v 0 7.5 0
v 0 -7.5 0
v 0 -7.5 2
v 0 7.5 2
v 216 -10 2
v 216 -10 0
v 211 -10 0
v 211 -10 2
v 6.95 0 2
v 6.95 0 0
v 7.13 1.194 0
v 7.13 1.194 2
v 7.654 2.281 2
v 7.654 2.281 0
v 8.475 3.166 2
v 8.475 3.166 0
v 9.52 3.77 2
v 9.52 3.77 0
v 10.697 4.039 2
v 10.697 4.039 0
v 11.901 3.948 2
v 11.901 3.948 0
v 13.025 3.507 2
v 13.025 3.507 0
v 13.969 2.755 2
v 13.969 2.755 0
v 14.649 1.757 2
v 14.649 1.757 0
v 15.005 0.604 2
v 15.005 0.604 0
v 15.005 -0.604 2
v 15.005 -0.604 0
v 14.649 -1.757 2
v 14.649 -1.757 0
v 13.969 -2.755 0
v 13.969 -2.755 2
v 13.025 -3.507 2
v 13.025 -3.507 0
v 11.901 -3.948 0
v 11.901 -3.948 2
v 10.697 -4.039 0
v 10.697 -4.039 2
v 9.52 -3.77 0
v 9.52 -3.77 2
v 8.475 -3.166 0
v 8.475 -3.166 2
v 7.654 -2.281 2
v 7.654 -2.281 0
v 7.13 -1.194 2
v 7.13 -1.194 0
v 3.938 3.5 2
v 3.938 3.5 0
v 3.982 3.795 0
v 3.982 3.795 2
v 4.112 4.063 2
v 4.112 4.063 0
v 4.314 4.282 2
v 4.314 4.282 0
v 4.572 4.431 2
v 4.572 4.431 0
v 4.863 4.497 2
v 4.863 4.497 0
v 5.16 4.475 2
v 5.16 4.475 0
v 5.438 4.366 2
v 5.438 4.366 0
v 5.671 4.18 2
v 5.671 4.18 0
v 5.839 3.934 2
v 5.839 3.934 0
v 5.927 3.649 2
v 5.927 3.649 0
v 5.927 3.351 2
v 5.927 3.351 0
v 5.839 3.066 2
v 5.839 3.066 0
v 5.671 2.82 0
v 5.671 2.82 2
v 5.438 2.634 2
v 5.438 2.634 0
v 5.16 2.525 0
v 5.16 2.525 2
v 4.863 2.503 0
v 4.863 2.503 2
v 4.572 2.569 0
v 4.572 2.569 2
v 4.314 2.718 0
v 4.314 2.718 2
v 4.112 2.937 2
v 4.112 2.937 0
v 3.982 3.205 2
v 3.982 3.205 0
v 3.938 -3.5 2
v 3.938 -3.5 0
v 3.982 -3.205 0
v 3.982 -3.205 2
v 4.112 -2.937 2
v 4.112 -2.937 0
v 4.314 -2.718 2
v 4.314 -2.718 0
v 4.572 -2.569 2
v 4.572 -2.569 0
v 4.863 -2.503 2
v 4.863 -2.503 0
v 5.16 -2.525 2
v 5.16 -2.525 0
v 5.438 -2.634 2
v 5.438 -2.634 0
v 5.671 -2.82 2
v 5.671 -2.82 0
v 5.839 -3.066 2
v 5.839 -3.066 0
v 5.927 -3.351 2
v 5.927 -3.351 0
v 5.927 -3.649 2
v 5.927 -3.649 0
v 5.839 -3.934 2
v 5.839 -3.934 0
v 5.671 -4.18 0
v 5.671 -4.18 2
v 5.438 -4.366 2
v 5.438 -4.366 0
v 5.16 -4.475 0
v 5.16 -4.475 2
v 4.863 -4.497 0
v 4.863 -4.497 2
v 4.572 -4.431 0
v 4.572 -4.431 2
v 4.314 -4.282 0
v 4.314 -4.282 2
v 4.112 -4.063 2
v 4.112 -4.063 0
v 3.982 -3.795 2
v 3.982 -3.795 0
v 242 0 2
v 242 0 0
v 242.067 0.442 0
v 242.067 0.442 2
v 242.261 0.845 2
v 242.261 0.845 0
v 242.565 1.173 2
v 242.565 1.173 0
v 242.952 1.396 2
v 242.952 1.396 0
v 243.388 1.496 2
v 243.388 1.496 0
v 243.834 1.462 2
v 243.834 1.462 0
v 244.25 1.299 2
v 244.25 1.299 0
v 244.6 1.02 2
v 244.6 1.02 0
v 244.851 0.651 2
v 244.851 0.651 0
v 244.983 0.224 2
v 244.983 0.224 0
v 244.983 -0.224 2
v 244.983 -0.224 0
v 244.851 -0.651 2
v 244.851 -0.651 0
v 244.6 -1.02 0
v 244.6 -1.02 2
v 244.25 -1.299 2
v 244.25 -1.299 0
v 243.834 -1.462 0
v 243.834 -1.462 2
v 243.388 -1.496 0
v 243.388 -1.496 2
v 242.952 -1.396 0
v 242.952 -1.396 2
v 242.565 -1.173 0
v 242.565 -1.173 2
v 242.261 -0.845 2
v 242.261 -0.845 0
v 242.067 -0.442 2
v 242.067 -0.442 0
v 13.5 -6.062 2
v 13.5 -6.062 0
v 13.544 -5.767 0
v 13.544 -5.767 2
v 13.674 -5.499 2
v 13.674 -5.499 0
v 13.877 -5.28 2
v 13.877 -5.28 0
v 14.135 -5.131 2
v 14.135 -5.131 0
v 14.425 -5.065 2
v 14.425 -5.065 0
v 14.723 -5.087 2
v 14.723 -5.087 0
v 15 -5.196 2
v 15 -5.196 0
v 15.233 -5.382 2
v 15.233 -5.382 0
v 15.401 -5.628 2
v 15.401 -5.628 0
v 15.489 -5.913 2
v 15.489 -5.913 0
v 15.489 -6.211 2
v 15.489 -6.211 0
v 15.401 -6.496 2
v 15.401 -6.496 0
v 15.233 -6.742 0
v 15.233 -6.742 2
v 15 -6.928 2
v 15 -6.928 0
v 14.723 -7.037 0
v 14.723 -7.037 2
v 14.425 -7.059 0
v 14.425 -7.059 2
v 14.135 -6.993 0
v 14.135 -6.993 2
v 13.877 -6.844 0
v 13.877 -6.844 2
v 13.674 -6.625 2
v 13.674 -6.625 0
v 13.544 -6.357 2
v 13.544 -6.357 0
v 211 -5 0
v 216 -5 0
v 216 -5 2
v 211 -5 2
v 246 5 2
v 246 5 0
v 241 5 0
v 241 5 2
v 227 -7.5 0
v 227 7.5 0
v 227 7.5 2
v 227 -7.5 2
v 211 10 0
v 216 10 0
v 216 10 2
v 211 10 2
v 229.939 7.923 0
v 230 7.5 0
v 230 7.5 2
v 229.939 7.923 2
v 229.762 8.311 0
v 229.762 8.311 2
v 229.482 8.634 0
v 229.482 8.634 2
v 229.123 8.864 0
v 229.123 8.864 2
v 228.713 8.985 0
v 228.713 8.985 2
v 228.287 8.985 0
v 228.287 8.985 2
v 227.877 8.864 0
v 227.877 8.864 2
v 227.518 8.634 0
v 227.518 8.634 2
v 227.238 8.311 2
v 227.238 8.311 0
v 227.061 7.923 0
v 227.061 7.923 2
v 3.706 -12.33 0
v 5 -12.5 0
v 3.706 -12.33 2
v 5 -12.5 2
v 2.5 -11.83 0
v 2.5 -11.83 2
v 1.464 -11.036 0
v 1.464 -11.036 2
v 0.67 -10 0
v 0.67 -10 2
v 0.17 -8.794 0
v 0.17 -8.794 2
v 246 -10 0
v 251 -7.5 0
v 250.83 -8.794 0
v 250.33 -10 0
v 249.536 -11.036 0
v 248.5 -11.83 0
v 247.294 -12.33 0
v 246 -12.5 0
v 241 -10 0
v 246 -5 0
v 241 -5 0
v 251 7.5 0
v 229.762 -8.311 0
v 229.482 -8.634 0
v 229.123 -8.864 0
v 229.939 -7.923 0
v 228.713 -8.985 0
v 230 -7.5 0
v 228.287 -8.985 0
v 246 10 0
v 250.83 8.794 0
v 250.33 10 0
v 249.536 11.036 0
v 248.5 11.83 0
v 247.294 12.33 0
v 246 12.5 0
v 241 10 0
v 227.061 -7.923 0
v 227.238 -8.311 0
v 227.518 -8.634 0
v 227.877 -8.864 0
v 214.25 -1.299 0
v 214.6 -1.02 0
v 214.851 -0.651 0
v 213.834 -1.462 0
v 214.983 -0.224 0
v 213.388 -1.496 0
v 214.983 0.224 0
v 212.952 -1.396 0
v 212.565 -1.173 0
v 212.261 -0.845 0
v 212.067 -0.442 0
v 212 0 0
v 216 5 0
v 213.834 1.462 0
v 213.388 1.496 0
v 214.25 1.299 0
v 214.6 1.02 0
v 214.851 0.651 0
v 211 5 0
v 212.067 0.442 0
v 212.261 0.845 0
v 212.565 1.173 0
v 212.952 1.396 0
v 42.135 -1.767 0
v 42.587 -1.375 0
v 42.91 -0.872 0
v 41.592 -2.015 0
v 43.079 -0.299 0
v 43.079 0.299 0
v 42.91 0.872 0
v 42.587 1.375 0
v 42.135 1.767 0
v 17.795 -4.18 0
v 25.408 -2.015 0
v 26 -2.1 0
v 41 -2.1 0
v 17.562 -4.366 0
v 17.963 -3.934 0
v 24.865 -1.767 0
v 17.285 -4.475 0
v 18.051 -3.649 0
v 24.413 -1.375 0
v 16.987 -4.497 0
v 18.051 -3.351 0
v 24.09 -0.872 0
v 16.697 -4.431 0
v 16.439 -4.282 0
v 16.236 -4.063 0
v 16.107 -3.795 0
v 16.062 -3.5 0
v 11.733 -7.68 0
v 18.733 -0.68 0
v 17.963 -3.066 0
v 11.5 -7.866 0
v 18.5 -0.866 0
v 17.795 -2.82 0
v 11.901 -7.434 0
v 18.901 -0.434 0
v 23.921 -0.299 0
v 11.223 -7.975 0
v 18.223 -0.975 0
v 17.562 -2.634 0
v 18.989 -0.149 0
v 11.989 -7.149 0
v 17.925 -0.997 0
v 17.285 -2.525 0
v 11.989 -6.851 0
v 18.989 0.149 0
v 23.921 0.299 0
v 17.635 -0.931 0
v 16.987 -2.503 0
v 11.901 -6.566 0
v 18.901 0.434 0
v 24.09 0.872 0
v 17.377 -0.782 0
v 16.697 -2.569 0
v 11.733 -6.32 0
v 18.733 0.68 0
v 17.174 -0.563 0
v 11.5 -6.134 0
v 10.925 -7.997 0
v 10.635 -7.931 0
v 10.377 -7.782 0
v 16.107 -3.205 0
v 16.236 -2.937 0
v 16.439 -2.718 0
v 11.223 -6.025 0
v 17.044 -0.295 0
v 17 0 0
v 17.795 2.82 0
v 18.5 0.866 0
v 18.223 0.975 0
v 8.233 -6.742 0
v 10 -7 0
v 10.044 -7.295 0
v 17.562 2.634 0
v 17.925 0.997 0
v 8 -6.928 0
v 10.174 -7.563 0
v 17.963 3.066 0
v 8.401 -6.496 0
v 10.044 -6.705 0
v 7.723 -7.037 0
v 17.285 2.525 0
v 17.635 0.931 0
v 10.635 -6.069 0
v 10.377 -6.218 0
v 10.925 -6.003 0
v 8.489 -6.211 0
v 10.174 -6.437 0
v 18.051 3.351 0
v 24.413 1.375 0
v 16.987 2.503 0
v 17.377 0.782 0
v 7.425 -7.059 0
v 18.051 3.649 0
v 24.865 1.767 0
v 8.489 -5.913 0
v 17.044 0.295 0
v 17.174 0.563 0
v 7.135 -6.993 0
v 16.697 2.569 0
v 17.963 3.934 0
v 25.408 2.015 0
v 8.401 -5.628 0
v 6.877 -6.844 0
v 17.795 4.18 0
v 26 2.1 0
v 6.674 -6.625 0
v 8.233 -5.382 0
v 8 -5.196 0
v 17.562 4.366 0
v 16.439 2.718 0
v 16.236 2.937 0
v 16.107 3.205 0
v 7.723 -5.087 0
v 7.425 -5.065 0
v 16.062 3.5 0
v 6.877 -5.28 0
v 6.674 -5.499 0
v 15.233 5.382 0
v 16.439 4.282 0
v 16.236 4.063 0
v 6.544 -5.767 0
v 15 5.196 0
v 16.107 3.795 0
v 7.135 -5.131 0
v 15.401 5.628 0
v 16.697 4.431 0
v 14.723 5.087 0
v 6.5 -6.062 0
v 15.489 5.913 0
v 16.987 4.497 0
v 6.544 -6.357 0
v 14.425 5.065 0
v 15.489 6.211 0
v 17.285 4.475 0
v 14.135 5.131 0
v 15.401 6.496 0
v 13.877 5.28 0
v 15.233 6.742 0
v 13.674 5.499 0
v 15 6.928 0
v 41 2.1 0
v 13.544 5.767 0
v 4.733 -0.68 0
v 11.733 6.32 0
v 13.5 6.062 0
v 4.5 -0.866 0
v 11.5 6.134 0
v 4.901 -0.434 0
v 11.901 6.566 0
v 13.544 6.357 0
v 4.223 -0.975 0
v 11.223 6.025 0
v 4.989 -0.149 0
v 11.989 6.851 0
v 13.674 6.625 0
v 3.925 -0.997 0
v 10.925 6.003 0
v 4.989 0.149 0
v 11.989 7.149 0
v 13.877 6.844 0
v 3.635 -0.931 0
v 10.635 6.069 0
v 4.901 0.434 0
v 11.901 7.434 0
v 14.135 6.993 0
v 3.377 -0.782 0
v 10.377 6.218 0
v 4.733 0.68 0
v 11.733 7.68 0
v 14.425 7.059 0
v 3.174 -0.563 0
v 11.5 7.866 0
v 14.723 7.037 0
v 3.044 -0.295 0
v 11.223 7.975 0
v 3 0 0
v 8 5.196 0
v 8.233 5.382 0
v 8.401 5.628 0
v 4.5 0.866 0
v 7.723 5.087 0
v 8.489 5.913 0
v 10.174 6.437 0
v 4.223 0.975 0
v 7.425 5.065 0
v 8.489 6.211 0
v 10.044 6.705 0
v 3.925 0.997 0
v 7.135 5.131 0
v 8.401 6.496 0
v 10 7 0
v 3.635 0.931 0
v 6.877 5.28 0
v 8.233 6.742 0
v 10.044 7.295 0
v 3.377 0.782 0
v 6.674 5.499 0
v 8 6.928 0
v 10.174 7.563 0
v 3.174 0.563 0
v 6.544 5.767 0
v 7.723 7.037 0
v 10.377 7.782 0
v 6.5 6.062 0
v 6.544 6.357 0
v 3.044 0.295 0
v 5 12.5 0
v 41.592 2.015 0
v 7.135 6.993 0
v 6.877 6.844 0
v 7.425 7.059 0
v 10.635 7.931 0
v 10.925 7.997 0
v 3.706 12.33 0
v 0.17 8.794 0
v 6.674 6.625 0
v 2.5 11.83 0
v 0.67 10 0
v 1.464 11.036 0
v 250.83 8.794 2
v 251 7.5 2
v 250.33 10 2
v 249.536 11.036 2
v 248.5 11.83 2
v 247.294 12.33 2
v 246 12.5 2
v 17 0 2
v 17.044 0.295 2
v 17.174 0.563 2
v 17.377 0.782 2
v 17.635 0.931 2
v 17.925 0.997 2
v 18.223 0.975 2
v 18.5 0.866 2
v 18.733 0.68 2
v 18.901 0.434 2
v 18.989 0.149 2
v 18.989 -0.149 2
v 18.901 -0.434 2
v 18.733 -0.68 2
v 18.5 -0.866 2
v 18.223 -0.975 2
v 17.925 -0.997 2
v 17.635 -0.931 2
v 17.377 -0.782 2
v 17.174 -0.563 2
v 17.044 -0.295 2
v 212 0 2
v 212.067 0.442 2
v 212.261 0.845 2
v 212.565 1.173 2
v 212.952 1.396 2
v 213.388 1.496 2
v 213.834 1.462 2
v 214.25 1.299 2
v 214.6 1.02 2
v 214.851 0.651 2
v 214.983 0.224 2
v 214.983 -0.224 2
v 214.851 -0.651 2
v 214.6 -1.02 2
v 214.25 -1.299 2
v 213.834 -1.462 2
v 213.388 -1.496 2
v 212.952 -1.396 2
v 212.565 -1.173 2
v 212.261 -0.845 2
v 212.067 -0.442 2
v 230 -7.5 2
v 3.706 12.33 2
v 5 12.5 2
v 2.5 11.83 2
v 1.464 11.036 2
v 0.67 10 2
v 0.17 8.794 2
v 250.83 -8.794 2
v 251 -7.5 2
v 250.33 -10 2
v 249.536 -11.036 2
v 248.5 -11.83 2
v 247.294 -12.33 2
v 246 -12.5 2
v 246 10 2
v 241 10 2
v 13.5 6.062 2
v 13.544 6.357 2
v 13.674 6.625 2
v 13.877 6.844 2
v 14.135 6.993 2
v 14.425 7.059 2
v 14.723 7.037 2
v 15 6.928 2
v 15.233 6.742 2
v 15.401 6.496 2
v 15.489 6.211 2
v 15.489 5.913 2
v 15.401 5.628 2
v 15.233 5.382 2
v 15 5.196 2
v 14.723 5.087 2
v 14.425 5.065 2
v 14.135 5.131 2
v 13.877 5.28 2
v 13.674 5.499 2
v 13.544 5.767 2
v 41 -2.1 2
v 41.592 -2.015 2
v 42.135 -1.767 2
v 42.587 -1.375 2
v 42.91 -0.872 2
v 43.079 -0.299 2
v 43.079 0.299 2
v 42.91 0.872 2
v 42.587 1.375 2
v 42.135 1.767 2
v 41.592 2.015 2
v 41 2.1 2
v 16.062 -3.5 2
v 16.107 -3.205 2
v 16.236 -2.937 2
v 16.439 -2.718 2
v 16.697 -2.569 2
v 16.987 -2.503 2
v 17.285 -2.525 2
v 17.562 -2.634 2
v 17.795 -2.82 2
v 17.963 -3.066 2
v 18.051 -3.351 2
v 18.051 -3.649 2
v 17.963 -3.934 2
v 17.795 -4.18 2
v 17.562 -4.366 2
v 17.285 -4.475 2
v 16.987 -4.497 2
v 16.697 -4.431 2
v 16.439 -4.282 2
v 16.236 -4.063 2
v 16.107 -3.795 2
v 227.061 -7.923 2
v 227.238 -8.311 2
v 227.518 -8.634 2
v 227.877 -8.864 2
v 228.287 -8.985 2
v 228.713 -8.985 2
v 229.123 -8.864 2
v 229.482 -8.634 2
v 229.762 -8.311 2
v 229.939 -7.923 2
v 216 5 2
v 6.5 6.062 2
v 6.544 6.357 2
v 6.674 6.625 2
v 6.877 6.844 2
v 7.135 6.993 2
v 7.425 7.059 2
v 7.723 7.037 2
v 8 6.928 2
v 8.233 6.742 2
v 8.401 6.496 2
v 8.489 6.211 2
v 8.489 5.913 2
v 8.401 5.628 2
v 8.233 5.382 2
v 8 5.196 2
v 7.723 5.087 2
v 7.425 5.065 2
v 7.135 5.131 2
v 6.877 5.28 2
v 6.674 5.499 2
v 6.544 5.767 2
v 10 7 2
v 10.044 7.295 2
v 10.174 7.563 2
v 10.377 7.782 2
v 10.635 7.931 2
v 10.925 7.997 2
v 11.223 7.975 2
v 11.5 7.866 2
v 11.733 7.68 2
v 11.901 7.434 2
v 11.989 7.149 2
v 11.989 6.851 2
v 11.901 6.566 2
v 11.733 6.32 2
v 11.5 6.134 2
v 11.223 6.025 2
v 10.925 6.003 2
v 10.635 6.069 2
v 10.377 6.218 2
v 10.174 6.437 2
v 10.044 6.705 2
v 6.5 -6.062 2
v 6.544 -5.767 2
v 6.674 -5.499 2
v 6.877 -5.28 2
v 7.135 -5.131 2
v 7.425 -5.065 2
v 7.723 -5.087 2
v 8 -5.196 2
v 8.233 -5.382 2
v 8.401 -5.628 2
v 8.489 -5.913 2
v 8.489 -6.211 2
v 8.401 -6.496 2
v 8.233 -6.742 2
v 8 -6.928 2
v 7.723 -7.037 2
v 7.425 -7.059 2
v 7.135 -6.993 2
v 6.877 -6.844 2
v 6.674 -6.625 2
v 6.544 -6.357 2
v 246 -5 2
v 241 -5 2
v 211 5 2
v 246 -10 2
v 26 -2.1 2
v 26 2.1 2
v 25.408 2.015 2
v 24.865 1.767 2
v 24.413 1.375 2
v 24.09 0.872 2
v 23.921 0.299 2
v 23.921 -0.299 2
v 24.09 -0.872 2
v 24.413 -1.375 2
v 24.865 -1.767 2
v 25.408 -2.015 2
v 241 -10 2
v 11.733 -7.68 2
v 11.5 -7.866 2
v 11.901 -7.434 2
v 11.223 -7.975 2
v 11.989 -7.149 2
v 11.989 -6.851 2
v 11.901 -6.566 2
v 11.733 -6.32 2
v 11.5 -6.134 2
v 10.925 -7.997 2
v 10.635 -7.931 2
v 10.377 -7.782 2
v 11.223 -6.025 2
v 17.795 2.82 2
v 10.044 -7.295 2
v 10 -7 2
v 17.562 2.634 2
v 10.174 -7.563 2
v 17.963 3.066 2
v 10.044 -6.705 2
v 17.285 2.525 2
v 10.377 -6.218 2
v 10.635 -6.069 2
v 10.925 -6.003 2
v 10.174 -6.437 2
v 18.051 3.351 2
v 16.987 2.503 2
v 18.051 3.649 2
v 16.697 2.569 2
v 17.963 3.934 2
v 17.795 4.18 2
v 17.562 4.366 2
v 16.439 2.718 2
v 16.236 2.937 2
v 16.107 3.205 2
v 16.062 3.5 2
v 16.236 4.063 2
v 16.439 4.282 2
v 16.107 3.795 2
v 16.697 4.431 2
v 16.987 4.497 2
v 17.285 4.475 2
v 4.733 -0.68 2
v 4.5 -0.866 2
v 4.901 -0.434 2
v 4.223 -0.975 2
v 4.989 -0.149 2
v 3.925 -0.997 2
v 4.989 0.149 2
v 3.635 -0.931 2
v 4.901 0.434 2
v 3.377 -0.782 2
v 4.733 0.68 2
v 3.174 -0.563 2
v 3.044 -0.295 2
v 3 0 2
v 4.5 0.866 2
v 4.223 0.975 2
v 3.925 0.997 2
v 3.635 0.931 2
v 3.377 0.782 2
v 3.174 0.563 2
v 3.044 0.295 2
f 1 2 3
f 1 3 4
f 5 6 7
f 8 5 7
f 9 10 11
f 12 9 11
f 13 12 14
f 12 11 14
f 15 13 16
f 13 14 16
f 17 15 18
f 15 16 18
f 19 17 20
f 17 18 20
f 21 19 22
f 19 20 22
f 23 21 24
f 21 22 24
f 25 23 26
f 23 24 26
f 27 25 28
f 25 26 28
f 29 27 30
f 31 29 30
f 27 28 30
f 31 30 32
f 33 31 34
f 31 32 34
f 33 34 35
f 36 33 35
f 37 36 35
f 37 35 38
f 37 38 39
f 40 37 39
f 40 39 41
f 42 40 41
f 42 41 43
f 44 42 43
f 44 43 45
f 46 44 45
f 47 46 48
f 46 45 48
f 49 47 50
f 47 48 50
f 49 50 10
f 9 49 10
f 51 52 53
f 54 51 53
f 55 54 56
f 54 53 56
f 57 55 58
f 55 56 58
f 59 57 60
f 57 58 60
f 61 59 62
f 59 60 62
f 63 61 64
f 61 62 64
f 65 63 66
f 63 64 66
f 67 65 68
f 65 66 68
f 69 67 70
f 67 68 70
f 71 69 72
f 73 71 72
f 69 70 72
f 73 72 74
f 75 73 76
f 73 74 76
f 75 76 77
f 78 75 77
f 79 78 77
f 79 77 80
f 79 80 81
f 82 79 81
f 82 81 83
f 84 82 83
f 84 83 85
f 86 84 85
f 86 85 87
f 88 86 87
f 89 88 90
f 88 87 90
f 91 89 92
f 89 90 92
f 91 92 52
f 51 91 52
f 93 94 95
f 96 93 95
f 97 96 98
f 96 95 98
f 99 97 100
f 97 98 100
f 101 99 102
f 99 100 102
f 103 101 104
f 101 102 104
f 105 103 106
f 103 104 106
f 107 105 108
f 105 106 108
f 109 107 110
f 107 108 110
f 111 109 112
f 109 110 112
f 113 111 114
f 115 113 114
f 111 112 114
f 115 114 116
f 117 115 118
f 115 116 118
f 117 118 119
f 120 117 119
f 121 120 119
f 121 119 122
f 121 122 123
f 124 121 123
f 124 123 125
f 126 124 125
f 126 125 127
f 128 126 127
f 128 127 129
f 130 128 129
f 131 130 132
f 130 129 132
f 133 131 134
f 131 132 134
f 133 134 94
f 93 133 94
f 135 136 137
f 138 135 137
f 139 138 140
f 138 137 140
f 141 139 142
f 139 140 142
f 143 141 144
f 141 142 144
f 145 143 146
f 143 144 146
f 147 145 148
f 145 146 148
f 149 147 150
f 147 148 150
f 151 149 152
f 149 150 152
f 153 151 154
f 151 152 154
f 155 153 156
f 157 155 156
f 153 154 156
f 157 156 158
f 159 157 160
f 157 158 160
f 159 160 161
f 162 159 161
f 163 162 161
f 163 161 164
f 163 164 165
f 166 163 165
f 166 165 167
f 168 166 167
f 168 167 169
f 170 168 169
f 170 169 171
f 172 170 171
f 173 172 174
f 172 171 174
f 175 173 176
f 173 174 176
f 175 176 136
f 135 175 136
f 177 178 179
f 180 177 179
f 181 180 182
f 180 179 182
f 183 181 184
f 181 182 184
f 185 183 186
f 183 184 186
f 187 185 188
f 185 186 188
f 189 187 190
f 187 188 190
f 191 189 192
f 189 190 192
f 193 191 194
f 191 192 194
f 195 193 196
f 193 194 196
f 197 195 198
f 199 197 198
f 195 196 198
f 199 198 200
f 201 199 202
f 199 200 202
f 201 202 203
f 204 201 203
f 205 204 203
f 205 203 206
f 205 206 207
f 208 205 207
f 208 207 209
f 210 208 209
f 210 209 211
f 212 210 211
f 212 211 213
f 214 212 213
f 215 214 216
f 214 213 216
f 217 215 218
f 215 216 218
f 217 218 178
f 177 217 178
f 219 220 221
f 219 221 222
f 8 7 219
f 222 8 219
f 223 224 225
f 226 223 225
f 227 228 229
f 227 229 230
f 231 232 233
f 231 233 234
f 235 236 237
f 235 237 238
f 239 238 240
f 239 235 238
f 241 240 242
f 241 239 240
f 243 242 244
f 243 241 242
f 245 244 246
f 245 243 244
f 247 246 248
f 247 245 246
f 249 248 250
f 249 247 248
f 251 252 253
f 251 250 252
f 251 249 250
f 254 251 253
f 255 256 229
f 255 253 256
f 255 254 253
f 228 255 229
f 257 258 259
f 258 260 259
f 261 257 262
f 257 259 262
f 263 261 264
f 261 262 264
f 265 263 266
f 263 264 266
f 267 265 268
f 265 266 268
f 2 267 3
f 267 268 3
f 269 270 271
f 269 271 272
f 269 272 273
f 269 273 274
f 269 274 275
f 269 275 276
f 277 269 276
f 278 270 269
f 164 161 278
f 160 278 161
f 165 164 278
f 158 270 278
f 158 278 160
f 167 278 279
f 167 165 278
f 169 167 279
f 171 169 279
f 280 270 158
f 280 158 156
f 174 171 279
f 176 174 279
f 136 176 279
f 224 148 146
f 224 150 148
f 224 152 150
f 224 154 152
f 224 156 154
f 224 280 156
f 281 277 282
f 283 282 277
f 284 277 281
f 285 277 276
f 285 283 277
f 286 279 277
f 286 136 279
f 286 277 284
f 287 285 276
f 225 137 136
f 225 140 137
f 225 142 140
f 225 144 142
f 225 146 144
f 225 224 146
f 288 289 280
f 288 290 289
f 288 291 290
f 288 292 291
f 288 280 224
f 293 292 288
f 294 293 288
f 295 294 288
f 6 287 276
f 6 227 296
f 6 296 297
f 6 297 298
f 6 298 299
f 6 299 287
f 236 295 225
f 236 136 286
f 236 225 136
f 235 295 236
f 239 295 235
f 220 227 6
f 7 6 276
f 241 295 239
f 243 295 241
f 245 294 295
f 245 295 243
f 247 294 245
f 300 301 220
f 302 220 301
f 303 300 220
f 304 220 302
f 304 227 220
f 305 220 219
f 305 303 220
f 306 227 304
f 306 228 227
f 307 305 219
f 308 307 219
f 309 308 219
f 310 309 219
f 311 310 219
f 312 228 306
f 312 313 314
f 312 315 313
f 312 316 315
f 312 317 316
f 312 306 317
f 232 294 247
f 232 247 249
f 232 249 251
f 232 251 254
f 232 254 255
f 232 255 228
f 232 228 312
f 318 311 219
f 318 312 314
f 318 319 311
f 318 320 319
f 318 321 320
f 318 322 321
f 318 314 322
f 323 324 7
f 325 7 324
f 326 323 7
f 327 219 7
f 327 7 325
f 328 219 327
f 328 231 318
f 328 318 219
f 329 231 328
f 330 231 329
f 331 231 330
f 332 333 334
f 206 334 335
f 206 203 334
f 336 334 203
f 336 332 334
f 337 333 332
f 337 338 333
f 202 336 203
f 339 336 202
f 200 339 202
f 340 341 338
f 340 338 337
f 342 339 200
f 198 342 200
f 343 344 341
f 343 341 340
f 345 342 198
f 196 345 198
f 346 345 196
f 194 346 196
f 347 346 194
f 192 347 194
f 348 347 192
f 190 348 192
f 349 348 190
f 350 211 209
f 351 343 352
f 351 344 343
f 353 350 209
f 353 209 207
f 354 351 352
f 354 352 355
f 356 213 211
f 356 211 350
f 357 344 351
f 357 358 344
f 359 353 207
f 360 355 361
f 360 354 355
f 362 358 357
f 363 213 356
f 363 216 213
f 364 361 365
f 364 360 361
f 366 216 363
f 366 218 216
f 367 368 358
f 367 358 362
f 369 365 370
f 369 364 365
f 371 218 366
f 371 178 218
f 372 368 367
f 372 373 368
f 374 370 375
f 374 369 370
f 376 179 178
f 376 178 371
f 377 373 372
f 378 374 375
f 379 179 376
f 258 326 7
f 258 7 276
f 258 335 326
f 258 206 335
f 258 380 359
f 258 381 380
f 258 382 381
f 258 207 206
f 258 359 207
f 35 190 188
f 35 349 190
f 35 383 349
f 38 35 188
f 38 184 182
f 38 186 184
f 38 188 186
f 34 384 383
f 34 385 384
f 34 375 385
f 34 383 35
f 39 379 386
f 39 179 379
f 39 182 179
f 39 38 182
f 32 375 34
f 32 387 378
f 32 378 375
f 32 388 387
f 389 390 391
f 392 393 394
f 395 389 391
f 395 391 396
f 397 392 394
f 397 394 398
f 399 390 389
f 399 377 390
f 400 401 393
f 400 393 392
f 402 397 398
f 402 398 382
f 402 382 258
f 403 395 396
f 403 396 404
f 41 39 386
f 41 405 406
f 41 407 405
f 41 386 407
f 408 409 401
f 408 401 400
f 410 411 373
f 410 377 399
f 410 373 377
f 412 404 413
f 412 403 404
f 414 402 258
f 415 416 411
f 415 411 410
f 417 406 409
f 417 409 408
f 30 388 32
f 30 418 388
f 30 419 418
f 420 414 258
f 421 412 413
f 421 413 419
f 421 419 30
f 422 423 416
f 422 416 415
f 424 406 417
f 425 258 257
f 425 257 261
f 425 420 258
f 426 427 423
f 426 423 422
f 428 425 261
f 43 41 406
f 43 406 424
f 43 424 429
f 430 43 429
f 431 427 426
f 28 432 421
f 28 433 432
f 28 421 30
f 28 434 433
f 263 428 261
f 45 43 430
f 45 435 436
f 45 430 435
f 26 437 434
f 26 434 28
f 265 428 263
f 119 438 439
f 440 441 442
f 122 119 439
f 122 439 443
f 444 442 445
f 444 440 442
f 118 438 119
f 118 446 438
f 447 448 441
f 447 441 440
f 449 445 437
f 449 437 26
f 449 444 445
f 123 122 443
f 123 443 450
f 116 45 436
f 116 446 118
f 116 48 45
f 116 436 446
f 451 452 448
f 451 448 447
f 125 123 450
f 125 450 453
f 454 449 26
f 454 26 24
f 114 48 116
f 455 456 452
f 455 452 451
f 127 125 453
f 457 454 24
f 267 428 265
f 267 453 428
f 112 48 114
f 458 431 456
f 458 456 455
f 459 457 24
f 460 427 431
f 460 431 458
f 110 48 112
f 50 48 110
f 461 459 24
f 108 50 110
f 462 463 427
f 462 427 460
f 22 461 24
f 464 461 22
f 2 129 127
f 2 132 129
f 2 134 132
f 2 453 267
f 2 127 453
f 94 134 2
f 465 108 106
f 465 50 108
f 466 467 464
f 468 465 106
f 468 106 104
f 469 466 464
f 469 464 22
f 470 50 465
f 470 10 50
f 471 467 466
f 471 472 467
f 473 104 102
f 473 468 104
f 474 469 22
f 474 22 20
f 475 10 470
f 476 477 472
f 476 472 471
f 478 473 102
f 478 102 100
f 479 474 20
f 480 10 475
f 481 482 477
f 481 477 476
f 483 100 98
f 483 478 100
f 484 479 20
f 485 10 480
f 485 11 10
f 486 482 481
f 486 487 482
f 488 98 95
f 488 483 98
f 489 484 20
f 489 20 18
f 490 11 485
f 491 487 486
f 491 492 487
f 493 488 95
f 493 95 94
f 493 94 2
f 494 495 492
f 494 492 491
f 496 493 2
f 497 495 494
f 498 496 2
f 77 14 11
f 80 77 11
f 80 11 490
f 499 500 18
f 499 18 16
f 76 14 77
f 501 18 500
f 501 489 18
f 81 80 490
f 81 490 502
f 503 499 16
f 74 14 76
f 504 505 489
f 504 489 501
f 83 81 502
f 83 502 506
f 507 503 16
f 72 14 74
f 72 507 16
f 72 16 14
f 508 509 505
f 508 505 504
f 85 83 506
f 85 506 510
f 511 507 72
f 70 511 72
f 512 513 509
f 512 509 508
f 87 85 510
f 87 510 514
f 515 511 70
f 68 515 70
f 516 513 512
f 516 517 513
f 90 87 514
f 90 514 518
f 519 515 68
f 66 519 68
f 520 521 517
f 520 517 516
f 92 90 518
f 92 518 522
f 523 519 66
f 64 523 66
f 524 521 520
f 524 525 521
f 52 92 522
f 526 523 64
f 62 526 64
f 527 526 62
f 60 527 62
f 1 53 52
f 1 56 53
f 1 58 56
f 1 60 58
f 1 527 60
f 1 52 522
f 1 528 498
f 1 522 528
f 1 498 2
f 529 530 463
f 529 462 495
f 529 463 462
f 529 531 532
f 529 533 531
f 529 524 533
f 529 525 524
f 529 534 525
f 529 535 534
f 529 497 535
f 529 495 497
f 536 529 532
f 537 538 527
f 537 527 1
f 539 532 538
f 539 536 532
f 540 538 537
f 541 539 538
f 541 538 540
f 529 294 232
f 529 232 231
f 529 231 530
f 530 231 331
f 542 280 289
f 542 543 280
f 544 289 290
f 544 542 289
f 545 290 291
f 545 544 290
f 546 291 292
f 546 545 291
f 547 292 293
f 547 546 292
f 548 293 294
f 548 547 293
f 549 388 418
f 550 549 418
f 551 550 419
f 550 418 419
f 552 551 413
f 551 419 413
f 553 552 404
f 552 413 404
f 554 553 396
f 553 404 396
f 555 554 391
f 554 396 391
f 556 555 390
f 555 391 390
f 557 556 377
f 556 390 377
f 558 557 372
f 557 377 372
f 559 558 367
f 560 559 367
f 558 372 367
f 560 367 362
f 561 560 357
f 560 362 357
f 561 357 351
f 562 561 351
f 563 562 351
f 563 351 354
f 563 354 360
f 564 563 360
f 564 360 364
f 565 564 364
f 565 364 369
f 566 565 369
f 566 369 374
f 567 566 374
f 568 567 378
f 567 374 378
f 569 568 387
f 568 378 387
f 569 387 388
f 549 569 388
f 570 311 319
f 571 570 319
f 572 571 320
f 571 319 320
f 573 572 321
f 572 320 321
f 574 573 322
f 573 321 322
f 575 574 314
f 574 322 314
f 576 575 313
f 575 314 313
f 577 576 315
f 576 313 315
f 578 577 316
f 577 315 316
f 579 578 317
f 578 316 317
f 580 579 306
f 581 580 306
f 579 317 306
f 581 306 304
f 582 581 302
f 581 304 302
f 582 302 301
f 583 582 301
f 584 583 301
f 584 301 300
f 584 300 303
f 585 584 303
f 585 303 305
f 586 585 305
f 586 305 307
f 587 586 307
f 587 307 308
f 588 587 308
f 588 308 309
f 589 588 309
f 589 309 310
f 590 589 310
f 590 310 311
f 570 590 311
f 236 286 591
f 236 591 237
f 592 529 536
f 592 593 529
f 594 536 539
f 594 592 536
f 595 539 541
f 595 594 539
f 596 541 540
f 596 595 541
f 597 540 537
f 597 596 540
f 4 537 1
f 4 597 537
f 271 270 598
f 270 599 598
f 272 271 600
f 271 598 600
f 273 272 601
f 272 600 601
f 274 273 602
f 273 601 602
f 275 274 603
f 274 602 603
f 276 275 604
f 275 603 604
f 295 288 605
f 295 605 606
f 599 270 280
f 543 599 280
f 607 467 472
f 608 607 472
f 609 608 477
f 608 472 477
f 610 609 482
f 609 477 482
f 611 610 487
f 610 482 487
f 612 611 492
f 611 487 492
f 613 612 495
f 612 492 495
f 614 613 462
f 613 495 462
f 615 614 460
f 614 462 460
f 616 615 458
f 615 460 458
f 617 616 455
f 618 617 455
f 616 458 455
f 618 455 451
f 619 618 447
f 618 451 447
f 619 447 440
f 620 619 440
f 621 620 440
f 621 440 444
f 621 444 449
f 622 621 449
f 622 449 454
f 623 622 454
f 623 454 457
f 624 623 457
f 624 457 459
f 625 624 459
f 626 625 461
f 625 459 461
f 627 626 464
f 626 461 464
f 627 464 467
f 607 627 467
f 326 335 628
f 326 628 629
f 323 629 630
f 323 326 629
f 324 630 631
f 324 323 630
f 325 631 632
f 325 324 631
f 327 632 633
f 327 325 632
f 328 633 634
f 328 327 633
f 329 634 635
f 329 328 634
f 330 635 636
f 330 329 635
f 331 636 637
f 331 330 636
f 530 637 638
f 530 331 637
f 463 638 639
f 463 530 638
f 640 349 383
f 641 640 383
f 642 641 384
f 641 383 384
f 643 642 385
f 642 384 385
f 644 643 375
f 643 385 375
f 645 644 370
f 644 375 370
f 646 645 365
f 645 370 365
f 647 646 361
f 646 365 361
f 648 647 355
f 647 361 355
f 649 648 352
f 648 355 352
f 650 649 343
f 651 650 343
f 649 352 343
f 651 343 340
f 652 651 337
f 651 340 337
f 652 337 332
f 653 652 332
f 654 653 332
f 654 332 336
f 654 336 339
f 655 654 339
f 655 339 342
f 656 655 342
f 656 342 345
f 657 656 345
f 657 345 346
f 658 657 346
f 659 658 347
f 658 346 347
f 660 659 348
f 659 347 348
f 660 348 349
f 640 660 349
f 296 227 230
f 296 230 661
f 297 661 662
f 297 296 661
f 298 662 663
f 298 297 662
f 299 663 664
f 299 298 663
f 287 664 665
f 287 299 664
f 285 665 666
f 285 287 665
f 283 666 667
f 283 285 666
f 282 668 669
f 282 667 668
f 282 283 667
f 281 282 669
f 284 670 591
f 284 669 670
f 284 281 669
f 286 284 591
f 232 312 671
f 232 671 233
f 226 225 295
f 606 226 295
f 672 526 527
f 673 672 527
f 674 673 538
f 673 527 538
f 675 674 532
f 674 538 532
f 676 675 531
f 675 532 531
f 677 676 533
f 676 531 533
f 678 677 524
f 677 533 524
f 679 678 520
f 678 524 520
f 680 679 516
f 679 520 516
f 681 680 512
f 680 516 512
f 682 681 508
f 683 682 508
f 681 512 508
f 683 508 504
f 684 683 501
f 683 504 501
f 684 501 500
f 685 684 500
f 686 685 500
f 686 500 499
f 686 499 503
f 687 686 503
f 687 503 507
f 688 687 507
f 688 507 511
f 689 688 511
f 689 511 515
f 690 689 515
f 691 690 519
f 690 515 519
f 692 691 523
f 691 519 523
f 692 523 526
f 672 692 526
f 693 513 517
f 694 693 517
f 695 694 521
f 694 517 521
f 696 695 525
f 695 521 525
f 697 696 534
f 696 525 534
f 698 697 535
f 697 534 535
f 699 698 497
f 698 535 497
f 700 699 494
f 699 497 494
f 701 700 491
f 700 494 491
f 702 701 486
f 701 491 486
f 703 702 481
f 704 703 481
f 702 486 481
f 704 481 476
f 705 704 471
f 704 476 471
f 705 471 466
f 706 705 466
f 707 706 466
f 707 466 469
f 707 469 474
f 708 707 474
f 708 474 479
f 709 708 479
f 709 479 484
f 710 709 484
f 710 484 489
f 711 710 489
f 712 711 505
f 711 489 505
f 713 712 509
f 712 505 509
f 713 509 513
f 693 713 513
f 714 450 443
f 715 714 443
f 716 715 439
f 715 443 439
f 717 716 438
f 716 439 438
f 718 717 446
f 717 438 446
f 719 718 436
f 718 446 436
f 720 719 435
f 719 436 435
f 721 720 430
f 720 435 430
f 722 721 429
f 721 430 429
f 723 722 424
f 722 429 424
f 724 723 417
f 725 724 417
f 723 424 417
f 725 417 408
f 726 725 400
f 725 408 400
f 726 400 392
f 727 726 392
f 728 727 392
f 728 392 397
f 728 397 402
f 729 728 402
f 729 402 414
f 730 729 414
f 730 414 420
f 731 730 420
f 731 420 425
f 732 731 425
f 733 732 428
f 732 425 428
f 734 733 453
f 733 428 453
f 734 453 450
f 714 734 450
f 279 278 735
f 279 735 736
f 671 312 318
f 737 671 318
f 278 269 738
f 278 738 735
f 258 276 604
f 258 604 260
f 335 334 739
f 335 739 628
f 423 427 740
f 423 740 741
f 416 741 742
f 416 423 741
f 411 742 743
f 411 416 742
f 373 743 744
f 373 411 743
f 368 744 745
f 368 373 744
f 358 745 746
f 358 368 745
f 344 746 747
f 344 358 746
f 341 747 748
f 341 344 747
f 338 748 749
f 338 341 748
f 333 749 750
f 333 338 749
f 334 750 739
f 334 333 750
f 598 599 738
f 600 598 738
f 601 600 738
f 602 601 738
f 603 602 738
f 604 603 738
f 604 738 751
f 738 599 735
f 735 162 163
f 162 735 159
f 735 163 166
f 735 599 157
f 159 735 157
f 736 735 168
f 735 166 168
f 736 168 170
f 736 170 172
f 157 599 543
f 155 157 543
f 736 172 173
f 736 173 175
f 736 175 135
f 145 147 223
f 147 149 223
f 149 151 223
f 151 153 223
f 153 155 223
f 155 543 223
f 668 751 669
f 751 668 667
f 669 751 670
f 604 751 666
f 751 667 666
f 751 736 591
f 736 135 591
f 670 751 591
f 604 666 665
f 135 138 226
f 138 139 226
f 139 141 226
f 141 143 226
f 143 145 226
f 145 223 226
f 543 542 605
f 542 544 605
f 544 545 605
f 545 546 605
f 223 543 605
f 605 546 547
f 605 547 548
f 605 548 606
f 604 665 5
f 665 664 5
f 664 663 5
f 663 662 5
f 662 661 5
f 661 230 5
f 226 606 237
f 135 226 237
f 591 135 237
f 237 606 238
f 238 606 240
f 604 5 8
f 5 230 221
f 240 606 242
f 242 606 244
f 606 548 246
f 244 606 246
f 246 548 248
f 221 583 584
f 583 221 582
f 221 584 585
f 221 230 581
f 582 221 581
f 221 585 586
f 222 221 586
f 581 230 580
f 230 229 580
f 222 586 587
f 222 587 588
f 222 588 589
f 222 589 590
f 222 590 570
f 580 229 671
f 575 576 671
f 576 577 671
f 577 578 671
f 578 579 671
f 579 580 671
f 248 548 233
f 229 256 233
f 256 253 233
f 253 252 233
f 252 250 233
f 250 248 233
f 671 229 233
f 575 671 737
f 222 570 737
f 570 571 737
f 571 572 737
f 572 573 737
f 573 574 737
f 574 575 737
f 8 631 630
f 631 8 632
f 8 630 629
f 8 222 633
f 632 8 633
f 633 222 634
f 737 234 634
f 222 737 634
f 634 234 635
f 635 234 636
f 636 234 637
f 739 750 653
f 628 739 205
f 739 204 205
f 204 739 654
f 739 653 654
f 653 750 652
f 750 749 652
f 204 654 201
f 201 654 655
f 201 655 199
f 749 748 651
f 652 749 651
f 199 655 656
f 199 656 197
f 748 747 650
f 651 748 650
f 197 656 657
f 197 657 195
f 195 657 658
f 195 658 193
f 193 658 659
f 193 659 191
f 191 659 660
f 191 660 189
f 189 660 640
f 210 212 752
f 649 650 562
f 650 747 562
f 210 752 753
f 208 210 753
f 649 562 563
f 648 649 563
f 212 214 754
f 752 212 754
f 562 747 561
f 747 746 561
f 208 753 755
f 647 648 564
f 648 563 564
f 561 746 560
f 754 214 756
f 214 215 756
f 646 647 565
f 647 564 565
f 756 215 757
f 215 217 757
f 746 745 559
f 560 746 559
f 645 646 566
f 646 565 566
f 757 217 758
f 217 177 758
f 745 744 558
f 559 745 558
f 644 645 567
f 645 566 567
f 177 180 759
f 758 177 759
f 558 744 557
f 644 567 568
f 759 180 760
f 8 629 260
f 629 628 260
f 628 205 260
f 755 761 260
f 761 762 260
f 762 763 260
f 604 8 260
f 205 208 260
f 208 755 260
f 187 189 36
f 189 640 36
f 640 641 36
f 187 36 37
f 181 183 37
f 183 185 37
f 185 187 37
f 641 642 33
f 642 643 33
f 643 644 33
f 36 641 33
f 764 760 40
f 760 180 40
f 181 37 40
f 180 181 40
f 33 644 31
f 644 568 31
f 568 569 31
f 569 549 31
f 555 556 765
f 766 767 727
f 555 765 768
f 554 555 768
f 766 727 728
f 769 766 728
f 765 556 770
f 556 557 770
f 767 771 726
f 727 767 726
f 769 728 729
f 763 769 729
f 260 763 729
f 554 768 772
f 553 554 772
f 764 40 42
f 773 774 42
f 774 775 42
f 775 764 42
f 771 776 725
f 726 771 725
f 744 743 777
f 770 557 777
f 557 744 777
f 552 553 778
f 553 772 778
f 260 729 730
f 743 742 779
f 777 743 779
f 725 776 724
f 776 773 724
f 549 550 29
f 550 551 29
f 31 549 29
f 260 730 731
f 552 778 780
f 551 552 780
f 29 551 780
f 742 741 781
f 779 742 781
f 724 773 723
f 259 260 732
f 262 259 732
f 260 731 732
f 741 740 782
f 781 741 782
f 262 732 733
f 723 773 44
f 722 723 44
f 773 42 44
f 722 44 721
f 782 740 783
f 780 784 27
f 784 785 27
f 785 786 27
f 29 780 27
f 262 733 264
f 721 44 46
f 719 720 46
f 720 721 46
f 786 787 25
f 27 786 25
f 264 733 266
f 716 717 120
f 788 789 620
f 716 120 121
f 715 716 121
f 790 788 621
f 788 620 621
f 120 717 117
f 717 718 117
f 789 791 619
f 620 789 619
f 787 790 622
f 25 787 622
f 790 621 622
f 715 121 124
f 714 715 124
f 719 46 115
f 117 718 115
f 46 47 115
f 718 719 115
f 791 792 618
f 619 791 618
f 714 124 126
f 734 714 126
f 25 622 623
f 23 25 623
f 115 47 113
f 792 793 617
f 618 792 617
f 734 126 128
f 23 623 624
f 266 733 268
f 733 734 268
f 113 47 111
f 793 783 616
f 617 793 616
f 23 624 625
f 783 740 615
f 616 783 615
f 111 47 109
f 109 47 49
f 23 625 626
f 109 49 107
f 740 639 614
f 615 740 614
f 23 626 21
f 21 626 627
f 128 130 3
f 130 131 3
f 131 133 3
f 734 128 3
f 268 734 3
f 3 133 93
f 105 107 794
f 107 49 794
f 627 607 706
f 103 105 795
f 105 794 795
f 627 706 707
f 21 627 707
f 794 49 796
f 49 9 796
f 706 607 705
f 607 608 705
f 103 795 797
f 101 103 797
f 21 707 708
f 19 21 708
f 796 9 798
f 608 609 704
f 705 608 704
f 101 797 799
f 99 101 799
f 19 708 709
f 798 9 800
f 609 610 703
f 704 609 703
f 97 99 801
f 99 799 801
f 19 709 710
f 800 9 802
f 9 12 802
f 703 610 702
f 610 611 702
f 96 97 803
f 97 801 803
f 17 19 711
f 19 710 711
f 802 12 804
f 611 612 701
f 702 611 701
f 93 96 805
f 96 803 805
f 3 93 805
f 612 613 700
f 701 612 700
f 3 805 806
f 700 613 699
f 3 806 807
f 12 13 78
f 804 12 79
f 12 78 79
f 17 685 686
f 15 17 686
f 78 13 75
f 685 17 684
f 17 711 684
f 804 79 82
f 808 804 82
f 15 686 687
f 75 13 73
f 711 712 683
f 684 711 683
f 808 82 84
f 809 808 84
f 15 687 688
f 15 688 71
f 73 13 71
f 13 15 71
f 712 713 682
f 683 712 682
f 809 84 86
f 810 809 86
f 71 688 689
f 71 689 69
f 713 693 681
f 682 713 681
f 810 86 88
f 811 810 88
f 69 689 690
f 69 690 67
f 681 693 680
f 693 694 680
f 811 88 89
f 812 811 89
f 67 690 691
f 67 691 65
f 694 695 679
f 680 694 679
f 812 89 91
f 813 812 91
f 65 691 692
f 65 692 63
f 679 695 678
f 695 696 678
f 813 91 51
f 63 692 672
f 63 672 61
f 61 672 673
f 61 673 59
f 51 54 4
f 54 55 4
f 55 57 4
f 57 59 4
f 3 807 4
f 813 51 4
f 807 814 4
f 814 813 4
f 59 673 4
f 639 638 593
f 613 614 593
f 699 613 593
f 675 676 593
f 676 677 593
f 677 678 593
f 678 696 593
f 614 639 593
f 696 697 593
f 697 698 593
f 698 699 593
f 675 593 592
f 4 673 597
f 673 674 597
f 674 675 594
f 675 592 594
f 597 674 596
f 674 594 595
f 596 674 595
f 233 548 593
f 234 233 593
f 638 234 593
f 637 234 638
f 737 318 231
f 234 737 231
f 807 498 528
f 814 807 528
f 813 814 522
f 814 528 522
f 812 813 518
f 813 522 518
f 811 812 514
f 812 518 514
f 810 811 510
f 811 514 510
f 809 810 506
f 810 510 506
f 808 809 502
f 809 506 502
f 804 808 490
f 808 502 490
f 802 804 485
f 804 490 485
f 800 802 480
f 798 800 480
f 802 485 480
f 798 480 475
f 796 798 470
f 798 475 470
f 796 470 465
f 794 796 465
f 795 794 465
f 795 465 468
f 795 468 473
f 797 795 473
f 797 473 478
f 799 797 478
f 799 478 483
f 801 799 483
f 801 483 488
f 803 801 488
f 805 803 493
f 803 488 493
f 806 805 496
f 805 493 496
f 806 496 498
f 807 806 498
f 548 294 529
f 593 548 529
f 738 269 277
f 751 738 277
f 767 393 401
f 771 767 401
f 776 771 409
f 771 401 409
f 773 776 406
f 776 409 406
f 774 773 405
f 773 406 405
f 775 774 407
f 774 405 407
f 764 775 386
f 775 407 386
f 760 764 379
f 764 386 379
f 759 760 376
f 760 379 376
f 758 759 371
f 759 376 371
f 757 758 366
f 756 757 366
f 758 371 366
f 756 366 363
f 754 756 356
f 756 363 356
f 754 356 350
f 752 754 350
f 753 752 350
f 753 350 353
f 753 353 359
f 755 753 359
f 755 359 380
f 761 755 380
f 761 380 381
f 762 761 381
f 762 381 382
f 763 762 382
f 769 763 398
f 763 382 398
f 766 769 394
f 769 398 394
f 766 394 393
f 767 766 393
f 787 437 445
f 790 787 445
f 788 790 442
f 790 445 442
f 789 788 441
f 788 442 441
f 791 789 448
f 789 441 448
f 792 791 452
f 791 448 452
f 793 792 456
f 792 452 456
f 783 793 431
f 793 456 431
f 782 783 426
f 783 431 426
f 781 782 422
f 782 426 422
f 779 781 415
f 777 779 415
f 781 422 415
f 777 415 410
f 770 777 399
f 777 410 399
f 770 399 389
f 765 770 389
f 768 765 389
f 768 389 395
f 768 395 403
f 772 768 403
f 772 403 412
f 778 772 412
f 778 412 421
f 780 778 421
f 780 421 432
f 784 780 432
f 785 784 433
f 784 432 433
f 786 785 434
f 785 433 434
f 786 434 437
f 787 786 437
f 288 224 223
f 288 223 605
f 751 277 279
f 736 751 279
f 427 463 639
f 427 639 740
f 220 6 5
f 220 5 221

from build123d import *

# Parameters (mm, degrees)
ESQUISSE2_W             = 251
ESQUISSE2_H             = 25
ESQUISSE2_R             = 4.05
ESQUISSE2_R_2           = 1
ESQUISSE2_R_3           = 1.5
ESQUISSE2_W_2           = 5
ESQUISSE2_H_2           = 5
BOSS_EXTRU_1_DEPTH      = 2
CONG_1_R                = 5
ESQUISSE3_R             = 1.5
ESQUISSE3_W             = 5
ESQUISSE3_H             = 5
ENL_V_MAT_EXTRU_1_DEPTH = 10


with BuildPart() as part:
    # Esquisse2 → Boss.-Extru.1 (new body)
    with BuildSketch(Plane(origin=(0, 0, 0), x_dir=(-1, 0, 0), z_dir=(0, 0, -1))):
        with Locations((-125.5, 0)):
            Rectangle(ESQUISSE2_W, ESQUISSE2_H)
        with Locations((-11, 0)):
            Circle(ESQUISSE2_R, mode=Mode.SUBTRACT)
        with Locations((-4, 0)):
            Circle(ESQUISSE2_R_2, mode=Mode.SUBTRACT)
        with Locations((-4.937822174, -3.5)):
            Circle(ESQUISSE2_R_2, mode=Mode.SUBTRACT)
        with Locations((-7.5, -6.062177826)):
            Circle(ESQUISSE2_R_2, mode=Mode.SUBTRACT)
        with Locations((-11, -7)):
            Circle(ESQUISSE2_R_2, mode=Mode.SUBTRACT)
        with Locations((-14.5, -6.062177826)):
            Circle(ESQUISSE2_R_2, mode=Mode.SUBTRACT)
        with Locations((-17.062177826, -3.5)):
            Circle(ESQUISSE2_R_2, mode=Mode.SUBTRACT)
        with Locations((-18, 0)):
            Circle(ESQUISSE2_R_2, mode=Mode.SUBTRACT)
        with Locations((-17.062177826, 3.5)):
            Circle(ESQUISSE2_R_2, mode=Mode.SUBTRACT)
        with Locations((-14.5, 6.062177826)):
            Circle(ESQUISSE2_R_2, mode=Mode.SUBTRACT)
        with Locations((-11, 7)):
            Circle(ESQUISSE2_R_2, mode=Mode.SUBTRACT)
        with Locations((-7.5, 6.062177826)):
            Circle(ESQUISSE2_R_2, mode=Mode.SUBTRACT)
        with Locations((-4.937822174, 3.5)):
            Circle(ESQUISSE2_R_2, mode=Mode.SUBTRACT)
        with Locations((-243.5, 0)):
            Circle(ESQUISSE2_R_3, mode=Mode.SUBTRACT)
        with BuildLine():
            Line((-26, -2.1), (-41, -2.1))
            ThreePointArc((-41, -2.1), (-43.1, 0), (-41, 2.1))
            Line((-41, 2.1), (-26, 2.1))
            ThreePointArc((-26, 2.1), (-23.9, 0), (-26, -2.1))
        make_face(mode=Mode.SUBTRACT)
        with Locations((-243.5, -7.5)):
            Rectangle(ESQUISSE2_W_2, ESQUISSE2_H_2, mode=Mode.SUBTRACT)
        with Locations((-243.5, 7.5)):
            Rectangle(ESQUISSE2_W_2, ESQUISSE2_H_2, mode=Mode.SUBTRACT)
    extrude(amount=-BOSS_EXTRU_1_DEPTH)

    # Congé1
    cong_1_edges = [part.edges().sort_by_distance(p)[0] for p in [
        (251, 12.5, 1),
        (0, 12.5, 1),
        (0, -12.5, 1),
        (251, -12.5, 1),
    ]]
    fillet(cong_1_edges, radius=CONG_1_R)

    # Esquisse3 → Enlèv. mat.-Extru.1 (cut)
    with BuildSketch(Plane(origin=(0, 0, 0), x_dir=(-1, 0, 0), z_dir=(0, 0, -1))):
        with Locations((-243.5, 0)):
            Circle(ESQUISSE3_R)
        with Locations((-213.5, 0)):
            Circle(ESQUISSE3_R)
        with Locations((-243.5, -7.5)):
            Rectangle(ESQUISSE3_W, ESQUISSE3_H)
        with Locations((-243.5, 7.5)):
            Rectangle(ESQUISSE3_W, ESQUISSE3_H)
        with Locations((-213.5, -7.5)):
            Rectangle(ESQUISSE3_W, ESQUISSE3_H)
        with Locations((-213.5, 7.5)):
            Rectangle(ESQUISSE3_W, ESQUISSE3_H)
        with BuildLine():
            Line((-230, -7.5), (-230, 7.5))
            ThreePointArc((-230, 7.5), (-228.5, 9), (-227, 7.5))
            Line((-227, 7.5), (-227, -7.5))
            ThreePointArc((-227, -7.5), (-228.5, -9), (-230, -7.5))
        make_face()
    extrude(amount=-ENL_V_MAT_EXTRU_1_DEPTH, mode=Mode.SUBTRACT)


solid = part.part
